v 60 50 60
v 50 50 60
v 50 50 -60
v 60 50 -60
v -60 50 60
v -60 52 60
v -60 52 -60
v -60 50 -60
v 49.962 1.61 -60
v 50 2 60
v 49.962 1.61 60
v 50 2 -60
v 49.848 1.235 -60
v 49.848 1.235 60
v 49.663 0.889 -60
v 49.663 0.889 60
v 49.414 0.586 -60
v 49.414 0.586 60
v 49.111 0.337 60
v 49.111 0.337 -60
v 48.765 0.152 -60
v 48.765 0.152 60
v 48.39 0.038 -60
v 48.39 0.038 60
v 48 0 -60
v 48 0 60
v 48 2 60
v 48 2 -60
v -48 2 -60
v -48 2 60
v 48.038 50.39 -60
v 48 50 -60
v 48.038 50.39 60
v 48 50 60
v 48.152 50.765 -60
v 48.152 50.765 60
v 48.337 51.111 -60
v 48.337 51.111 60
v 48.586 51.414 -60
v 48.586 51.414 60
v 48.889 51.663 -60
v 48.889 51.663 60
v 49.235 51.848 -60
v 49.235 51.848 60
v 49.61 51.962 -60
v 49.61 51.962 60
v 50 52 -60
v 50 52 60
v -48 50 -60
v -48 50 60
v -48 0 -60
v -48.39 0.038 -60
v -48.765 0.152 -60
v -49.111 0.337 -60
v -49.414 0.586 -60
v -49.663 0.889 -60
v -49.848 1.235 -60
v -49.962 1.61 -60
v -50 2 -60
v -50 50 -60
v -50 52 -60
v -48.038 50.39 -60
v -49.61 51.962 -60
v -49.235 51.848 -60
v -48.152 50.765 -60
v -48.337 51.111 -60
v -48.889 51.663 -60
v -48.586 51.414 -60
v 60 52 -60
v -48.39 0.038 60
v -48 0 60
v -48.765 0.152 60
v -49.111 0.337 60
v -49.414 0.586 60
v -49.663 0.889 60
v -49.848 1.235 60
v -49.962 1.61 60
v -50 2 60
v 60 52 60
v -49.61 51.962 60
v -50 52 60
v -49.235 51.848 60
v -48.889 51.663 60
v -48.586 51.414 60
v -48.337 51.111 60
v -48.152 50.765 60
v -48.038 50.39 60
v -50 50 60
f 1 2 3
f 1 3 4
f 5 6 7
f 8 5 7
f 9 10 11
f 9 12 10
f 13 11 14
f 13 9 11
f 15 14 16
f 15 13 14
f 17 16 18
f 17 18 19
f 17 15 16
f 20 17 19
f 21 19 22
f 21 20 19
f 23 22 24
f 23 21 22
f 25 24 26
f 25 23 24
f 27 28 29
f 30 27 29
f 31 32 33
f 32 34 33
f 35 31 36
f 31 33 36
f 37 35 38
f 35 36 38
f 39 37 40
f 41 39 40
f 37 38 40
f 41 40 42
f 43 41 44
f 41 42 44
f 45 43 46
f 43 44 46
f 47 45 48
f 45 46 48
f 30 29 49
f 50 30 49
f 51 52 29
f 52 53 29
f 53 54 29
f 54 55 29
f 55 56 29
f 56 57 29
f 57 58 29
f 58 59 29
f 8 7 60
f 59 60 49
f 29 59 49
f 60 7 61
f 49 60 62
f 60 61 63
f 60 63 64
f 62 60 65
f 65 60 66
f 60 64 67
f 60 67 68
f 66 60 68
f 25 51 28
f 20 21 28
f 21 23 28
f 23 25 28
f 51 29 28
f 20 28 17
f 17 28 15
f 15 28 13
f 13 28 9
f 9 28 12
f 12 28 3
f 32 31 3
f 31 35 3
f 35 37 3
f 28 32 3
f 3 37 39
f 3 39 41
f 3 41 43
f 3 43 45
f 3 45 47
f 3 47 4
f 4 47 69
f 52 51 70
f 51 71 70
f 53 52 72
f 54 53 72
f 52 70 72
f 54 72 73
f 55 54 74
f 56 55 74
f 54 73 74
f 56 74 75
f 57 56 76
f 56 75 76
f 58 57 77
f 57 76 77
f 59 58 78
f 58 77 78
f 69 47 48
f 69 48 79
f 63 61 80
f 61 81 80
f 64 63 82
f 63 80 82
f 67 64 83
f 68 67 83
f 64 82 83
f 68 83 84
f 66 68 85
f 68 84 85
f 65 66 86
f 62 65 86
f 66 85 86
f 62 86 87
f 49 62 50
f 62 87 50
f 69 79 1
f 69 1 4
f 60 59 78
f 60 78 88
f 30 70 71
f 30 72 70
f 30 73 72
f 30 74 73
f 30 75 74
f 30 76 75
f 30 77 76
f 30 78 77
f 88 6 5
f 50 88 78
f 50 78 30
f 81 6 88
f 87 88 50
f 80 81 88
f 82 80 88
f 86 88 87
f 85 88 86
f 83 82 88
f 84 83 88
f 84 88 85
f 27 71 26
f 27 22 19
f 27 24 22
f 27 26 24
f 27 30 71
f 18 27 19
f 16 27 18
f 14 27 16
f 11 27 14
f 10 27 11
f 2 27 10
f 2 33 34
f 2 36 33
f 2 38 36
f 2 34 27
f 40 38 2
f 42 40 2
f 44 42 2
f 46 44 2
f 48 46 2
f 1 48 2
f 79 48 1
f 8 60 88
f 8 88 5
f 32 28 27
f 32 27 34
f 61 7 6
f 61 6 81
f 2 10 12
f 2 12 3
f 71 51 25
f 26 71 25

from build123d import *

# Parameters (mm, degrees)
SKETCH_1_W          = 120
SKETCH_1_H          = 120
EXTRUDE_1_DEPTH     = 52
SKETCH_2_W          = 96
SKETCH_2_H          = 50
CUT_EXTRUDE_1_DEPTH = 144.888845989
SKETCH_4_W          = 10
SKETCH_4_H          = 50
CUT_EXTRUDE_2_DEPTH = 144.888845989
SKETCH_5_W          = 10
SKETCH_5_H          = 50
CUT_EXTRUDE_3_DEPTH = 144.888845989
FILLET_1_R          = 2


with BuildPart() as part:
    # 草图1 → 凸台-拉伸1 (new body)
    with BuildSketch(Plane(origin=(0, 52, 0), x_dir=(1, 0, 0), z_dir=(0, 1, 0))):
        Rectangle(SKETCH_1_W, SKETCH_1_H)
    extrude(amount=-EXTRUDE_1_DEPTH)

    # 草图2 → 切除-拉伸1 (cut, through all)
    with BuildSketch(Plane(origin=(0, 0, -60), x_dir=(-1, 0, 0), z_dir=(0, 0, -1))):
        with Locations((0, 27)):
            Rectangle(SKETCH_2_W, SKETCH_2_H)
    extrude(amount=-CUT_EXTRUDE_1_DEPTH, mode=Mode.SUBTRACT)

    # 草图4 → 切除-拉伸2 (cut, through all)
    with BuildSketch(Plane.XY.offset(60)):
        with Locations((55, 25)):
            Rectangle(SKETCH_4_W, SKETCH_4_H)
    extrude(amount=-CUT_EXTRUDE_2_DEPTH, mode=Mode.SUBTRACT)

    # 草图5 → 切除-拉伸3 (cut, through all)
    with BuildSketch(Plane(origin=(0, 0, -60), x_dir=(-1, 0, 0), z_dir=(0, 0, -1))):
        with Locations((55, 25)):
            Rectangle(SKETCH_5_W, SKETCH_5_H)
    extrude(amount=-CUT_EXTRUDE_3_DEPTH, mode=Mode.SUBTRACT)

    # 圆角1
    fillet_1_edges = [part.edges().sort_by_distance(p)[0] for p in [
        (48, 52, 0),
        (-48, 52, 0),
        (50, 0, 0),
        (-50, 0, 0),
    ]]
    fillet(fillet_1_edges, radius=FILLET_1_R)


solid = part.part
